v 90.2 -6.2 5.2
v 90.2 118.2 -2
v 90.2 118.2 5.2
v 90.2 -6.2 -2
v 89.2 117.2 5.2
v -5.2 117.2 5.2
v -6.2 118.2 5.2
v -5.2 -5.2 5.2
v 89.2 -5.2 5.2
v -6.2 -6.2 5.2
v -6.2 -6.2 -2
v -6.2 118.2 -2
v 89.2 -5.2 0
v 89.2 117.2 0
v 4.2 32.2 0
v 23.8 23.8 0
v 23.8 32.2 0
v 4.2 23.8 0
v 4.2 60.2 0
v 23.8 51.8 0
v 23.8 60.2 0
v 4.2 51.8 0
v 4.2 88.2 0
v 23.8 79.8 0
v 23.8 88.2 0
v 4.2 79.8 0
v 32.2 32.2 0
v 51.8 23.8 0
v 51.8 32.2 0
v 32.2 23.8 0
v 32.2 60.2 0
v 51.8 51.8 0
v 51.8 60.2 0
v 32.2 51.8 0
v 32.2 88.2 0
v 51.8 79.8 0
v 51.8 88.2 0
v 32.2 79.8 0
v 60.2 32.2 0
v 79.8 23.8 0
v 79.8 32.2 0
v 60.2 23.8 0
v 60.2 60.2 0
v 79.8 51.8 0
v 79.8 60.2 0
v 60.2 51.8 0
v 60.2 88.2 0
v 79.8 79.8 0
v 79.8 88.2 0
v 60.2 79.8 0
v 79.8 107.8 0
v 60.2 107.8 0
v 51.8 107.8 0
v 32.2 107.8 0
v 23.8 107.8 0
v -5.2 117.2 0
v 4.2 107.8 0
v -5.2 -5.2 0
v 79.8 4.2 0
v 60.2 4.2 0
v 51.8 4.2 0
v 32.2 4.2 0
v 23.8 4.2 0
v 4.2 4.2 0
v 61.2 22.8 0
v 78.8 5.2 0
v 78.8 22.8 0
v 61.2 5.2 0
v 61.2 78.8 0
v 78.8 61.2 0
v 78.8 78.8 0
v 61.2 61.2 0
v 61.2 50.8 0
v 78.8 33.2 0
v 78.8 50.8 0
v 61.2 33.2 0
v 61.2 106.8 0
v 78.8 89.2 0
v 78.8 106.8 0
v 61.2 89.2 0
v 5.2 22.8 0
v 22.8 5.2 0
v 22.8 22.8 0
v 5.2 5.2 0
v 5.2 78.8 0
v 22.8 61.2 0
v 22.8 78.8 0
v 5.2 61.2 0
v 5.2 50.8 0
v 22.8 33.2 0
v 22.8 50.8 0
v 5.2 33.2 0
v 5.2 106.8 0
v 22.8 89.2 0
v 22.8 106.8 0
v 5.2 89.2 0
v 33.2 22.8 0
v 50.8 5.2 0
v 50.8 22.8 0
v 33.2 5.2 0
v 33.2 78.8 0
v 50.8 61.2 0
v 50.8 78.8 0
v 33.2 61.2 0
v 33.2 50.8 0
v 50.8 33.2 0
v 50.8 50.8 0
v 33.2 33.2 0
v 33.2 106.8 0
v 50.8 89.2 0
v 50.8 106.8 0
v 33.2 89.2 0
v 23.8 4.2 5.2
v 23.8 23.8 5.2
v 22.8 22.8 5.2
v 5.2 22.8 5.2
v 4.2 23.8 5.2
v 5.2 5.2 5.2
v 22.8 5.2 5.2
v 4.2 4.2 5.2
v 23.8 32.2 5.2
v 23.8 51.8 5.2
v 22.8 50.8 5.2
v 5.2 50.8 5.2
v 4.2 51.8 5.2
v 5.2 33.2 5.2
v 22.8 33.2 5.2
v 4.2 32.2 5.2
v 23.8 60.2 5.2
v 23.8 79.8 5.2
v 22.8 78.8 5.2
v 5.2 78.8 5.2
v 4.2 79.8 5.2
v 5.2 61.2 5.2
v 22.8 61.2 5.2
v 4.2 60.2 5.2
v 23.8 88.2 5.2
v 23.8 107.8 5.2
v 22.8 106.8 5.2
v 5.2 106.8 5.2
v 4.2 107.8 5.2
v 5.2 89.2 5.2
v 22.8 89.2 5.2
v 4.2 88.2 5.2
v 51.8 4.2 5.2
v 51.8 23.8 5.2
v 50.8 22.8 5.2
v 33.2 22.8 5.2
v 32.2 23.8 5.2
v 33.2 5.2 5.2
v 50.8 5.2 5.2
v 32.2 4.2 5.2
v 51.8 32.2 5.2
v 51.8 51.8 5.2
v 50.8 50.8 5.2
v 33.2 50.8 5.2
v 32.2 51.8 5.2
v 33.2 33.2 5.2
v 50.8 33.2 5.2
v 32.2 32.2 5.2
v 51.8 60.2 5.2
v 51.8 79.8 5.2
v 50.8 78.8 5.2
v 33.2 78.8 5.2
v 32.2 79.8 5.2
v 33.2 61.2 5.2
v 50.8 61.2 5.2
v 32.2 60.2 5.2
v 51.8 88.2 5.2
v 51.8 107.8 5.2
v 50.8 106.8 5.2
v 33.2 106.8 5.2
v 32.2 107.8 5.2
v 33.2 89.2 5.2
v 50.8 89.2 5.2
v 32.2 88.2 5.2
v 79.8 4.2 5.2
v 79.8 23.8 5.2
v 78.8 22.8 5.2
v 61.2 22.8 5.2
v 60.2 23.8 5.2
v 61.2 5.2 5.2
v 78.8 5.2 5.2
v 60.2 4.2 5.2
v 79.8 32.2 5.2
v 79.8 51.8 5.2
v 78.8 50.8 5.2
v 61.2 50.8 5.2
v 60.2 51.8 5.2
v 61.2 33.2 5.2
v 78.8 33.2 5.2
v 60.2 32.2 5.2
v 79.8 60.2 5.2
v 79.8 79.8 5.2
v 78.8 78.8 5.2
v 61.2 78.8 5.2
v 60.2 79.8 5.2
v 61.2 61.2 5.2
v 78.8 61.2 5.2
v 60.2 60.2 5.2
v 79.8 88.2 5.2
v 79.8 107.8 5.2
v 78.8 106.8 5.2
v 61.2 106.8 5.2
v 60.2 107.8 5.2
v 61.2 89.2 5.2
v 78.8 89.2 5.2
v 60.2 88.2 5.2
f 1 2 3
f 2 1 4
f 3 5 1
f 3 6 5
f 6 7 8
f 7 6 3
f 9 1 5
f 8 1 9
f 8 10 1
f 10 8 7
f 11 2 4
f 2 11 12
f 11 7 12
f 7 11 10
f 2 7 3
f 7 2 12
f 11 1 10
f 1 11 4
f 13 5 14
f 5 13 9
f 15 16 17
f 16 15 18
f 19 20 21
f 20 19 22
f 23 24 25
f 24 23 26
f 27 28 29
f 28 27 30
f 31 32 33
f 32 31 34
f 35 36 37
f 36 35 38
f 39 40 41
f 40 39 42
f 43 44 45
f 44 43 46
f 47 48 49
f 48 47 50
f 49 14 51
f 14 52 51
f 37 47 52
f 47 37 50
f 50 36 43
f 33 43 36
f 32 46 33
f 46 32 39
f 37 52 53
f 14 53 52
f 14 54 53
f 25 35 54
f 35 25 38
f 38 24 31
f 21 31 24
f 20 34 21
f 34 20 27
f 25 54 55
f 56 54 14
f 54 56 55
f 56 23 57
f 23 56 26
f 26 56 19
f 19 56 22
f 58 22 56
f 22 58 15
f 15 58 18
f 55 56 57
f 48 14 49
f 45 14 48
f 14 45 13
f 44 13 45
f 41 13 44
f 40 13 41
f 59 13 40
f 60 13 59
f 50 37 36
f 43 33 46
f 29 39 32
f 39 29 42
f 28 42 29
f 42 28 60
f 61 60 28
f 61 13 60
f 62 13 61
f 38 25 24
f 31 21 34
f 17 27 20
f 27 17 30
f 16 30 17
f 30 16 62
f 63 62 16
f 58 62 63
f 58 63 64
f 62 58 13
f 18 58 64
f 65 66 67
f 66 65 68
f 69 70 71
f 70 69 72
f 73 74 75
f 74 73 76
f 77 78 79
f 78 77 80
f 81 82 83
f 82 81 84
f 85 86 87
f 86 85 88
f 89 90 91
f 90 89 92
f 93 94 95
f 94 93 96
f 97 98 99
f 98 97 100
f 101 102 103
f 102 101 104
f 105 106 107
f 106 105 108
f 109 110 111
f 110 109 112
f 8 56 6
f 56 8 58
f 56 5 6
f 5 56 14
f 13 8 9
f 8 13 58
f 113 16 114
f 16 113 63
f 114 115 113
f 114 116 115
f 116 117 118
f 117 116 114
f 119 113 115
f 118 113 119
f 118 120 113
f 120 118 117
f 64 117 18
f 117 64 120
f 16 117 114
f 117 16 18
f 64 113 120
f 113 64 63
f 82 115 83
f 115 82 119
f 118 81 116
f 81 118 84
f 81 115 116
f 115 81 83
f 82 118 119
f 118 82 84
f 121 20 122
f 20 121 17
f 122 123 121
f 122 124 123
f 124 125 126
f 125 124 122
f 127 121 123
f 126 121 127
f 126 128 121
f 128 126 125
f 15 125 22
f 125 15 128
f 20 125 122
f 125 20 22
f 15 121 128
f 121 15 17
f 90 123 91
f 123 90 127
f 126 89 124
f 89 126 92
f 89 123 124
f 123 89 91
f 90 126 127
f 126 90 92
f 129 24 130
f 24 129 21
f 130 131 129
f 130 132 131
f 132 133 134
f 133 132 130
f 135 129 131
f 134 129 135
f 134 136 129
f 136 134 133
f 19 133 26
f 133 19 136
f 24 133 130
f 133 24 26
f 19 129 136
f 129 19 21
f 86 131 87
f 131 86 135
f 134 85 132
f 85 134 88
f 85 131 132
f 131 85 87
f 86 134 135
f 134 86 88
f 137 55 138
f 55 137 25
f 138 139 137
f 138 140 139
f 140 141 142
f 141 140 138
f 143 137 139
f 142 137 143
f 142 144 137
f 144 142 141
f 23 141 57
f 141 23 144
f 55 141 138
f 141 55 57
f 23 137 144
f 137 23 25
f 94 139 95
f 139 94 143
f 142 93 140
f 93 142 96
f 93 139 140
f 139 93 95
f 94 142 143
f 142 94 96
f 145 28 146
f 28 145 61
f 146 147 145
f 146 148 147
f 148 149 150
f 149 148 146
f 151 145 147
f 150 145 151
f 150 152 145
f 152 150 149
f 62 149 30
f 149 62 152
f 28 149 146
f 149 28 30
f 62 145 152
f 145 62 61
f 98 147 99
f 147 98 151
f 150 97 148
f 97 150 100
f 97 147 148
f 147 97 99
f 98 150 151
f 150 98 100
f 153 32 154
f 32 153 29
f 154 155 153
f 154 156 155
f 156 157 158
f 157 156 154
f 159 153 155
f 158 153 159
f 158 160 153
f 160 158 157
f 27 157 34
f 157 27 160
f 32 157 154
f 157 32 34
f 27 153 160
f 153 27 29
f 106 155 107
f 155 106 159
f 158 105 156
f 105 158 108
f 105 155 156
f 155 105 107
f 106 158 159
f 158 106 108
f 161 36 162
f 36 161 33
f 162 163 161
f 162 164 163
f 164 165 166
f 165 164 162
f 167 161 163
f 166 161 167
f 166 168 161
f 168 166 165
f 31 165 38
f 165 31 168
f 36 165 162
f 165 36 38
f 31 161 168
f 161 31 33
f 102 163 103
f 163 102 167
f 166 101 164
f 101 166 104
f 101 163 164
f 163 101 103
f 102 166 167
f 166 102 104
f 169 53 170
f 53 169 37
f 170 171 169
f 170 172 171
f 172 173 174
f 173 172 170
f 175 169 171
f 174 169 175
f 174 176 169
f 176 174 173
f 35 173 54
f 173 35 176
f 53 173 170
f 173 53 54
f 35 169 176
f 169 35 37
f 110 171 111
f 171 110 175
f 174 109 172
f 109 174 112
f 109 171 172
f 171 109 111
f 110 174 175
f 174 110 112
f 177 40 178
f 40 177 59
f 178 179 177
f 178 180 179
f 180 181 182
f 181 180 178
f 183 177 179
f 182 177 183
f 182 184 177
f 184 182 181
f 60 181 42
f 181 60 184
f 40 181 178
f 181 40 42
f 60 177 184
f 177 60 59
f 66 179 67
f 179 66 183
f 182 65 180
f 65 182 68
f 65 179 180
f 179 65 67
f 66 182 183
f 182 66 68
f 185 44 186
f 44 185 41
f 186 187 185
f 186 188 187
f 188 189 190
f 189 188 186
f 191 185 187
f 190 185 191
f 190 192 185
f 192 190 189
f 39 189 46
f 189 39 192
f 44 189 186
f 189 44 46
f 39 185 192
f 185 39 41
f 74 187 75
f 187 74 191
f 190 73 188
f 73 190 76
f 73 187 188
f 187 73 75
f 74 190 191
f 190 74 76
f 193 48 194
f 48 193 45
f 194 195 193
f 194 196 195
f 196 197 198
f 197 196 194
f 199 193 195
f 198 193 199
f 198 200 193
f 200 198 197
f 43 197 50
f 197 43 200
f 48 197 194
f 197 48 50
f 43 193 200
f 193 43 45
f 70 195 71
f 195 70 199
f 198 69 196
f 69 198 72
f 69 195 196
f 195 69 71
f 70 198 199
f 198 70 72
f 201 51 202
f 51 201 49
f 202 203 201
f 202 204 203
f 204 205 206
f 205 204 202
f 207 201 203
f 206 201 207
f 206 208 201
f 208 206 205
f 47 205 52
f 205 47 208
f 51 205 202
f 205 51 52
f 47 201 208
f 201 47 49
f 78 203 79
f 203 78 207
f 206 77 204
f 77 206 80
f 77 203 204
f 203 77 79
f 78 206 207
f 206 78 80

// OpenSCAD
// Number of plots in a column.
plotRows = 3;

// Number of plots in a row.
plotColumns = 4;

// Additional padding around edges of the field, in mm. If set to -1, is set to padding for another plot. If set to 0, you can glue many fields together!
fieldPadding = -1;

// Size of each square plot, in mm. 
plotSize = 28;

// Maximum length of each plot's magnetic insert, in mm.
insertSize = 17.8; 

// Maximum height of each plot's magnetic insert, in mm.
insertHeight = 5;

// Thickness of walls around each plot and the entire field, in mm.
wallThickness = 1;

// Size between the insert and the top surface, in mm.
topLayerHeight = 2;

// Additional padding for inserts due to printing tolerance, in mm.
printerTolerance = 0.2;

  ////////////////////////
 // Computed Variables //
////////////////////////

// Distance around insert to the next plot, in mm.
insertPaddingWithTolerance = (plotSize - insertSize + printerTolerance)/2;

// Height of the insert with printer tolerance, in mm.
insertHeightWithTolerance = insertHeight + printerTolerance;

// Automatic field padding based on insert padding.
autoFieldPadding = fieldPadding < 0 ? insertPaddingWithTolerance : fieldPadding;

  ///////////////
 // Generator //
///////////////
union() {
    // Farming field
    difference () {
        // Entire field
        translate([-autoFieldPadding - wallThickness, -autoFieldPadding - wallThickness, -topLayerHeight])
        cube(size=[(plotRows * plotSize) + (autoFieldPadding * 2) + (wallThickness * 2), (plotColumns * plotSize) + (autoFieldPadding * 2) + (wallThickness * 2), insertHeightWithTolerance + topLayerHeight], center=false);
        
        // Shelled
        translate([-autoFieldPadding, -autoFieldPadding, 0])
        cube(size=[(plotRows * plotSize) + (autoFieldPadding * 2), (plotColumns * plotSize) + (autoFieldPadding * 2), insertHeightWithTolerance + topLayerHeight], center=false);
    }
    
    // Plot insert cutouts
    for(i = [0:plotRows-1]) {
        for(j = [0:plotColumns-1]) {
            difference() {
                translate([insertPaddingWithTolerance + (i * plotSize) - wallThickness, insertPaddingWithTolerance + (j * plotSize) - wallThickness, 0])
                cube([plotSize - (2 * insertPaddingWithTolerance) + (wallThickness * 2), plotSize - (2 * insertPaddingWithTolerance) + (wallThickness * 2), insertHeightWithTolerance]);
                
                translate([insertPaddingWithTolerance + (i * plotSize), insertPaddingWithTolerance + (j * plotSize), 0])
                cube([plotSize - (2 * insertPaddingWithTolerance), plotSize - (2 * insertPaddingWithTolerance), insertHeightWithTolerance]);
            }
        }
    }
}
